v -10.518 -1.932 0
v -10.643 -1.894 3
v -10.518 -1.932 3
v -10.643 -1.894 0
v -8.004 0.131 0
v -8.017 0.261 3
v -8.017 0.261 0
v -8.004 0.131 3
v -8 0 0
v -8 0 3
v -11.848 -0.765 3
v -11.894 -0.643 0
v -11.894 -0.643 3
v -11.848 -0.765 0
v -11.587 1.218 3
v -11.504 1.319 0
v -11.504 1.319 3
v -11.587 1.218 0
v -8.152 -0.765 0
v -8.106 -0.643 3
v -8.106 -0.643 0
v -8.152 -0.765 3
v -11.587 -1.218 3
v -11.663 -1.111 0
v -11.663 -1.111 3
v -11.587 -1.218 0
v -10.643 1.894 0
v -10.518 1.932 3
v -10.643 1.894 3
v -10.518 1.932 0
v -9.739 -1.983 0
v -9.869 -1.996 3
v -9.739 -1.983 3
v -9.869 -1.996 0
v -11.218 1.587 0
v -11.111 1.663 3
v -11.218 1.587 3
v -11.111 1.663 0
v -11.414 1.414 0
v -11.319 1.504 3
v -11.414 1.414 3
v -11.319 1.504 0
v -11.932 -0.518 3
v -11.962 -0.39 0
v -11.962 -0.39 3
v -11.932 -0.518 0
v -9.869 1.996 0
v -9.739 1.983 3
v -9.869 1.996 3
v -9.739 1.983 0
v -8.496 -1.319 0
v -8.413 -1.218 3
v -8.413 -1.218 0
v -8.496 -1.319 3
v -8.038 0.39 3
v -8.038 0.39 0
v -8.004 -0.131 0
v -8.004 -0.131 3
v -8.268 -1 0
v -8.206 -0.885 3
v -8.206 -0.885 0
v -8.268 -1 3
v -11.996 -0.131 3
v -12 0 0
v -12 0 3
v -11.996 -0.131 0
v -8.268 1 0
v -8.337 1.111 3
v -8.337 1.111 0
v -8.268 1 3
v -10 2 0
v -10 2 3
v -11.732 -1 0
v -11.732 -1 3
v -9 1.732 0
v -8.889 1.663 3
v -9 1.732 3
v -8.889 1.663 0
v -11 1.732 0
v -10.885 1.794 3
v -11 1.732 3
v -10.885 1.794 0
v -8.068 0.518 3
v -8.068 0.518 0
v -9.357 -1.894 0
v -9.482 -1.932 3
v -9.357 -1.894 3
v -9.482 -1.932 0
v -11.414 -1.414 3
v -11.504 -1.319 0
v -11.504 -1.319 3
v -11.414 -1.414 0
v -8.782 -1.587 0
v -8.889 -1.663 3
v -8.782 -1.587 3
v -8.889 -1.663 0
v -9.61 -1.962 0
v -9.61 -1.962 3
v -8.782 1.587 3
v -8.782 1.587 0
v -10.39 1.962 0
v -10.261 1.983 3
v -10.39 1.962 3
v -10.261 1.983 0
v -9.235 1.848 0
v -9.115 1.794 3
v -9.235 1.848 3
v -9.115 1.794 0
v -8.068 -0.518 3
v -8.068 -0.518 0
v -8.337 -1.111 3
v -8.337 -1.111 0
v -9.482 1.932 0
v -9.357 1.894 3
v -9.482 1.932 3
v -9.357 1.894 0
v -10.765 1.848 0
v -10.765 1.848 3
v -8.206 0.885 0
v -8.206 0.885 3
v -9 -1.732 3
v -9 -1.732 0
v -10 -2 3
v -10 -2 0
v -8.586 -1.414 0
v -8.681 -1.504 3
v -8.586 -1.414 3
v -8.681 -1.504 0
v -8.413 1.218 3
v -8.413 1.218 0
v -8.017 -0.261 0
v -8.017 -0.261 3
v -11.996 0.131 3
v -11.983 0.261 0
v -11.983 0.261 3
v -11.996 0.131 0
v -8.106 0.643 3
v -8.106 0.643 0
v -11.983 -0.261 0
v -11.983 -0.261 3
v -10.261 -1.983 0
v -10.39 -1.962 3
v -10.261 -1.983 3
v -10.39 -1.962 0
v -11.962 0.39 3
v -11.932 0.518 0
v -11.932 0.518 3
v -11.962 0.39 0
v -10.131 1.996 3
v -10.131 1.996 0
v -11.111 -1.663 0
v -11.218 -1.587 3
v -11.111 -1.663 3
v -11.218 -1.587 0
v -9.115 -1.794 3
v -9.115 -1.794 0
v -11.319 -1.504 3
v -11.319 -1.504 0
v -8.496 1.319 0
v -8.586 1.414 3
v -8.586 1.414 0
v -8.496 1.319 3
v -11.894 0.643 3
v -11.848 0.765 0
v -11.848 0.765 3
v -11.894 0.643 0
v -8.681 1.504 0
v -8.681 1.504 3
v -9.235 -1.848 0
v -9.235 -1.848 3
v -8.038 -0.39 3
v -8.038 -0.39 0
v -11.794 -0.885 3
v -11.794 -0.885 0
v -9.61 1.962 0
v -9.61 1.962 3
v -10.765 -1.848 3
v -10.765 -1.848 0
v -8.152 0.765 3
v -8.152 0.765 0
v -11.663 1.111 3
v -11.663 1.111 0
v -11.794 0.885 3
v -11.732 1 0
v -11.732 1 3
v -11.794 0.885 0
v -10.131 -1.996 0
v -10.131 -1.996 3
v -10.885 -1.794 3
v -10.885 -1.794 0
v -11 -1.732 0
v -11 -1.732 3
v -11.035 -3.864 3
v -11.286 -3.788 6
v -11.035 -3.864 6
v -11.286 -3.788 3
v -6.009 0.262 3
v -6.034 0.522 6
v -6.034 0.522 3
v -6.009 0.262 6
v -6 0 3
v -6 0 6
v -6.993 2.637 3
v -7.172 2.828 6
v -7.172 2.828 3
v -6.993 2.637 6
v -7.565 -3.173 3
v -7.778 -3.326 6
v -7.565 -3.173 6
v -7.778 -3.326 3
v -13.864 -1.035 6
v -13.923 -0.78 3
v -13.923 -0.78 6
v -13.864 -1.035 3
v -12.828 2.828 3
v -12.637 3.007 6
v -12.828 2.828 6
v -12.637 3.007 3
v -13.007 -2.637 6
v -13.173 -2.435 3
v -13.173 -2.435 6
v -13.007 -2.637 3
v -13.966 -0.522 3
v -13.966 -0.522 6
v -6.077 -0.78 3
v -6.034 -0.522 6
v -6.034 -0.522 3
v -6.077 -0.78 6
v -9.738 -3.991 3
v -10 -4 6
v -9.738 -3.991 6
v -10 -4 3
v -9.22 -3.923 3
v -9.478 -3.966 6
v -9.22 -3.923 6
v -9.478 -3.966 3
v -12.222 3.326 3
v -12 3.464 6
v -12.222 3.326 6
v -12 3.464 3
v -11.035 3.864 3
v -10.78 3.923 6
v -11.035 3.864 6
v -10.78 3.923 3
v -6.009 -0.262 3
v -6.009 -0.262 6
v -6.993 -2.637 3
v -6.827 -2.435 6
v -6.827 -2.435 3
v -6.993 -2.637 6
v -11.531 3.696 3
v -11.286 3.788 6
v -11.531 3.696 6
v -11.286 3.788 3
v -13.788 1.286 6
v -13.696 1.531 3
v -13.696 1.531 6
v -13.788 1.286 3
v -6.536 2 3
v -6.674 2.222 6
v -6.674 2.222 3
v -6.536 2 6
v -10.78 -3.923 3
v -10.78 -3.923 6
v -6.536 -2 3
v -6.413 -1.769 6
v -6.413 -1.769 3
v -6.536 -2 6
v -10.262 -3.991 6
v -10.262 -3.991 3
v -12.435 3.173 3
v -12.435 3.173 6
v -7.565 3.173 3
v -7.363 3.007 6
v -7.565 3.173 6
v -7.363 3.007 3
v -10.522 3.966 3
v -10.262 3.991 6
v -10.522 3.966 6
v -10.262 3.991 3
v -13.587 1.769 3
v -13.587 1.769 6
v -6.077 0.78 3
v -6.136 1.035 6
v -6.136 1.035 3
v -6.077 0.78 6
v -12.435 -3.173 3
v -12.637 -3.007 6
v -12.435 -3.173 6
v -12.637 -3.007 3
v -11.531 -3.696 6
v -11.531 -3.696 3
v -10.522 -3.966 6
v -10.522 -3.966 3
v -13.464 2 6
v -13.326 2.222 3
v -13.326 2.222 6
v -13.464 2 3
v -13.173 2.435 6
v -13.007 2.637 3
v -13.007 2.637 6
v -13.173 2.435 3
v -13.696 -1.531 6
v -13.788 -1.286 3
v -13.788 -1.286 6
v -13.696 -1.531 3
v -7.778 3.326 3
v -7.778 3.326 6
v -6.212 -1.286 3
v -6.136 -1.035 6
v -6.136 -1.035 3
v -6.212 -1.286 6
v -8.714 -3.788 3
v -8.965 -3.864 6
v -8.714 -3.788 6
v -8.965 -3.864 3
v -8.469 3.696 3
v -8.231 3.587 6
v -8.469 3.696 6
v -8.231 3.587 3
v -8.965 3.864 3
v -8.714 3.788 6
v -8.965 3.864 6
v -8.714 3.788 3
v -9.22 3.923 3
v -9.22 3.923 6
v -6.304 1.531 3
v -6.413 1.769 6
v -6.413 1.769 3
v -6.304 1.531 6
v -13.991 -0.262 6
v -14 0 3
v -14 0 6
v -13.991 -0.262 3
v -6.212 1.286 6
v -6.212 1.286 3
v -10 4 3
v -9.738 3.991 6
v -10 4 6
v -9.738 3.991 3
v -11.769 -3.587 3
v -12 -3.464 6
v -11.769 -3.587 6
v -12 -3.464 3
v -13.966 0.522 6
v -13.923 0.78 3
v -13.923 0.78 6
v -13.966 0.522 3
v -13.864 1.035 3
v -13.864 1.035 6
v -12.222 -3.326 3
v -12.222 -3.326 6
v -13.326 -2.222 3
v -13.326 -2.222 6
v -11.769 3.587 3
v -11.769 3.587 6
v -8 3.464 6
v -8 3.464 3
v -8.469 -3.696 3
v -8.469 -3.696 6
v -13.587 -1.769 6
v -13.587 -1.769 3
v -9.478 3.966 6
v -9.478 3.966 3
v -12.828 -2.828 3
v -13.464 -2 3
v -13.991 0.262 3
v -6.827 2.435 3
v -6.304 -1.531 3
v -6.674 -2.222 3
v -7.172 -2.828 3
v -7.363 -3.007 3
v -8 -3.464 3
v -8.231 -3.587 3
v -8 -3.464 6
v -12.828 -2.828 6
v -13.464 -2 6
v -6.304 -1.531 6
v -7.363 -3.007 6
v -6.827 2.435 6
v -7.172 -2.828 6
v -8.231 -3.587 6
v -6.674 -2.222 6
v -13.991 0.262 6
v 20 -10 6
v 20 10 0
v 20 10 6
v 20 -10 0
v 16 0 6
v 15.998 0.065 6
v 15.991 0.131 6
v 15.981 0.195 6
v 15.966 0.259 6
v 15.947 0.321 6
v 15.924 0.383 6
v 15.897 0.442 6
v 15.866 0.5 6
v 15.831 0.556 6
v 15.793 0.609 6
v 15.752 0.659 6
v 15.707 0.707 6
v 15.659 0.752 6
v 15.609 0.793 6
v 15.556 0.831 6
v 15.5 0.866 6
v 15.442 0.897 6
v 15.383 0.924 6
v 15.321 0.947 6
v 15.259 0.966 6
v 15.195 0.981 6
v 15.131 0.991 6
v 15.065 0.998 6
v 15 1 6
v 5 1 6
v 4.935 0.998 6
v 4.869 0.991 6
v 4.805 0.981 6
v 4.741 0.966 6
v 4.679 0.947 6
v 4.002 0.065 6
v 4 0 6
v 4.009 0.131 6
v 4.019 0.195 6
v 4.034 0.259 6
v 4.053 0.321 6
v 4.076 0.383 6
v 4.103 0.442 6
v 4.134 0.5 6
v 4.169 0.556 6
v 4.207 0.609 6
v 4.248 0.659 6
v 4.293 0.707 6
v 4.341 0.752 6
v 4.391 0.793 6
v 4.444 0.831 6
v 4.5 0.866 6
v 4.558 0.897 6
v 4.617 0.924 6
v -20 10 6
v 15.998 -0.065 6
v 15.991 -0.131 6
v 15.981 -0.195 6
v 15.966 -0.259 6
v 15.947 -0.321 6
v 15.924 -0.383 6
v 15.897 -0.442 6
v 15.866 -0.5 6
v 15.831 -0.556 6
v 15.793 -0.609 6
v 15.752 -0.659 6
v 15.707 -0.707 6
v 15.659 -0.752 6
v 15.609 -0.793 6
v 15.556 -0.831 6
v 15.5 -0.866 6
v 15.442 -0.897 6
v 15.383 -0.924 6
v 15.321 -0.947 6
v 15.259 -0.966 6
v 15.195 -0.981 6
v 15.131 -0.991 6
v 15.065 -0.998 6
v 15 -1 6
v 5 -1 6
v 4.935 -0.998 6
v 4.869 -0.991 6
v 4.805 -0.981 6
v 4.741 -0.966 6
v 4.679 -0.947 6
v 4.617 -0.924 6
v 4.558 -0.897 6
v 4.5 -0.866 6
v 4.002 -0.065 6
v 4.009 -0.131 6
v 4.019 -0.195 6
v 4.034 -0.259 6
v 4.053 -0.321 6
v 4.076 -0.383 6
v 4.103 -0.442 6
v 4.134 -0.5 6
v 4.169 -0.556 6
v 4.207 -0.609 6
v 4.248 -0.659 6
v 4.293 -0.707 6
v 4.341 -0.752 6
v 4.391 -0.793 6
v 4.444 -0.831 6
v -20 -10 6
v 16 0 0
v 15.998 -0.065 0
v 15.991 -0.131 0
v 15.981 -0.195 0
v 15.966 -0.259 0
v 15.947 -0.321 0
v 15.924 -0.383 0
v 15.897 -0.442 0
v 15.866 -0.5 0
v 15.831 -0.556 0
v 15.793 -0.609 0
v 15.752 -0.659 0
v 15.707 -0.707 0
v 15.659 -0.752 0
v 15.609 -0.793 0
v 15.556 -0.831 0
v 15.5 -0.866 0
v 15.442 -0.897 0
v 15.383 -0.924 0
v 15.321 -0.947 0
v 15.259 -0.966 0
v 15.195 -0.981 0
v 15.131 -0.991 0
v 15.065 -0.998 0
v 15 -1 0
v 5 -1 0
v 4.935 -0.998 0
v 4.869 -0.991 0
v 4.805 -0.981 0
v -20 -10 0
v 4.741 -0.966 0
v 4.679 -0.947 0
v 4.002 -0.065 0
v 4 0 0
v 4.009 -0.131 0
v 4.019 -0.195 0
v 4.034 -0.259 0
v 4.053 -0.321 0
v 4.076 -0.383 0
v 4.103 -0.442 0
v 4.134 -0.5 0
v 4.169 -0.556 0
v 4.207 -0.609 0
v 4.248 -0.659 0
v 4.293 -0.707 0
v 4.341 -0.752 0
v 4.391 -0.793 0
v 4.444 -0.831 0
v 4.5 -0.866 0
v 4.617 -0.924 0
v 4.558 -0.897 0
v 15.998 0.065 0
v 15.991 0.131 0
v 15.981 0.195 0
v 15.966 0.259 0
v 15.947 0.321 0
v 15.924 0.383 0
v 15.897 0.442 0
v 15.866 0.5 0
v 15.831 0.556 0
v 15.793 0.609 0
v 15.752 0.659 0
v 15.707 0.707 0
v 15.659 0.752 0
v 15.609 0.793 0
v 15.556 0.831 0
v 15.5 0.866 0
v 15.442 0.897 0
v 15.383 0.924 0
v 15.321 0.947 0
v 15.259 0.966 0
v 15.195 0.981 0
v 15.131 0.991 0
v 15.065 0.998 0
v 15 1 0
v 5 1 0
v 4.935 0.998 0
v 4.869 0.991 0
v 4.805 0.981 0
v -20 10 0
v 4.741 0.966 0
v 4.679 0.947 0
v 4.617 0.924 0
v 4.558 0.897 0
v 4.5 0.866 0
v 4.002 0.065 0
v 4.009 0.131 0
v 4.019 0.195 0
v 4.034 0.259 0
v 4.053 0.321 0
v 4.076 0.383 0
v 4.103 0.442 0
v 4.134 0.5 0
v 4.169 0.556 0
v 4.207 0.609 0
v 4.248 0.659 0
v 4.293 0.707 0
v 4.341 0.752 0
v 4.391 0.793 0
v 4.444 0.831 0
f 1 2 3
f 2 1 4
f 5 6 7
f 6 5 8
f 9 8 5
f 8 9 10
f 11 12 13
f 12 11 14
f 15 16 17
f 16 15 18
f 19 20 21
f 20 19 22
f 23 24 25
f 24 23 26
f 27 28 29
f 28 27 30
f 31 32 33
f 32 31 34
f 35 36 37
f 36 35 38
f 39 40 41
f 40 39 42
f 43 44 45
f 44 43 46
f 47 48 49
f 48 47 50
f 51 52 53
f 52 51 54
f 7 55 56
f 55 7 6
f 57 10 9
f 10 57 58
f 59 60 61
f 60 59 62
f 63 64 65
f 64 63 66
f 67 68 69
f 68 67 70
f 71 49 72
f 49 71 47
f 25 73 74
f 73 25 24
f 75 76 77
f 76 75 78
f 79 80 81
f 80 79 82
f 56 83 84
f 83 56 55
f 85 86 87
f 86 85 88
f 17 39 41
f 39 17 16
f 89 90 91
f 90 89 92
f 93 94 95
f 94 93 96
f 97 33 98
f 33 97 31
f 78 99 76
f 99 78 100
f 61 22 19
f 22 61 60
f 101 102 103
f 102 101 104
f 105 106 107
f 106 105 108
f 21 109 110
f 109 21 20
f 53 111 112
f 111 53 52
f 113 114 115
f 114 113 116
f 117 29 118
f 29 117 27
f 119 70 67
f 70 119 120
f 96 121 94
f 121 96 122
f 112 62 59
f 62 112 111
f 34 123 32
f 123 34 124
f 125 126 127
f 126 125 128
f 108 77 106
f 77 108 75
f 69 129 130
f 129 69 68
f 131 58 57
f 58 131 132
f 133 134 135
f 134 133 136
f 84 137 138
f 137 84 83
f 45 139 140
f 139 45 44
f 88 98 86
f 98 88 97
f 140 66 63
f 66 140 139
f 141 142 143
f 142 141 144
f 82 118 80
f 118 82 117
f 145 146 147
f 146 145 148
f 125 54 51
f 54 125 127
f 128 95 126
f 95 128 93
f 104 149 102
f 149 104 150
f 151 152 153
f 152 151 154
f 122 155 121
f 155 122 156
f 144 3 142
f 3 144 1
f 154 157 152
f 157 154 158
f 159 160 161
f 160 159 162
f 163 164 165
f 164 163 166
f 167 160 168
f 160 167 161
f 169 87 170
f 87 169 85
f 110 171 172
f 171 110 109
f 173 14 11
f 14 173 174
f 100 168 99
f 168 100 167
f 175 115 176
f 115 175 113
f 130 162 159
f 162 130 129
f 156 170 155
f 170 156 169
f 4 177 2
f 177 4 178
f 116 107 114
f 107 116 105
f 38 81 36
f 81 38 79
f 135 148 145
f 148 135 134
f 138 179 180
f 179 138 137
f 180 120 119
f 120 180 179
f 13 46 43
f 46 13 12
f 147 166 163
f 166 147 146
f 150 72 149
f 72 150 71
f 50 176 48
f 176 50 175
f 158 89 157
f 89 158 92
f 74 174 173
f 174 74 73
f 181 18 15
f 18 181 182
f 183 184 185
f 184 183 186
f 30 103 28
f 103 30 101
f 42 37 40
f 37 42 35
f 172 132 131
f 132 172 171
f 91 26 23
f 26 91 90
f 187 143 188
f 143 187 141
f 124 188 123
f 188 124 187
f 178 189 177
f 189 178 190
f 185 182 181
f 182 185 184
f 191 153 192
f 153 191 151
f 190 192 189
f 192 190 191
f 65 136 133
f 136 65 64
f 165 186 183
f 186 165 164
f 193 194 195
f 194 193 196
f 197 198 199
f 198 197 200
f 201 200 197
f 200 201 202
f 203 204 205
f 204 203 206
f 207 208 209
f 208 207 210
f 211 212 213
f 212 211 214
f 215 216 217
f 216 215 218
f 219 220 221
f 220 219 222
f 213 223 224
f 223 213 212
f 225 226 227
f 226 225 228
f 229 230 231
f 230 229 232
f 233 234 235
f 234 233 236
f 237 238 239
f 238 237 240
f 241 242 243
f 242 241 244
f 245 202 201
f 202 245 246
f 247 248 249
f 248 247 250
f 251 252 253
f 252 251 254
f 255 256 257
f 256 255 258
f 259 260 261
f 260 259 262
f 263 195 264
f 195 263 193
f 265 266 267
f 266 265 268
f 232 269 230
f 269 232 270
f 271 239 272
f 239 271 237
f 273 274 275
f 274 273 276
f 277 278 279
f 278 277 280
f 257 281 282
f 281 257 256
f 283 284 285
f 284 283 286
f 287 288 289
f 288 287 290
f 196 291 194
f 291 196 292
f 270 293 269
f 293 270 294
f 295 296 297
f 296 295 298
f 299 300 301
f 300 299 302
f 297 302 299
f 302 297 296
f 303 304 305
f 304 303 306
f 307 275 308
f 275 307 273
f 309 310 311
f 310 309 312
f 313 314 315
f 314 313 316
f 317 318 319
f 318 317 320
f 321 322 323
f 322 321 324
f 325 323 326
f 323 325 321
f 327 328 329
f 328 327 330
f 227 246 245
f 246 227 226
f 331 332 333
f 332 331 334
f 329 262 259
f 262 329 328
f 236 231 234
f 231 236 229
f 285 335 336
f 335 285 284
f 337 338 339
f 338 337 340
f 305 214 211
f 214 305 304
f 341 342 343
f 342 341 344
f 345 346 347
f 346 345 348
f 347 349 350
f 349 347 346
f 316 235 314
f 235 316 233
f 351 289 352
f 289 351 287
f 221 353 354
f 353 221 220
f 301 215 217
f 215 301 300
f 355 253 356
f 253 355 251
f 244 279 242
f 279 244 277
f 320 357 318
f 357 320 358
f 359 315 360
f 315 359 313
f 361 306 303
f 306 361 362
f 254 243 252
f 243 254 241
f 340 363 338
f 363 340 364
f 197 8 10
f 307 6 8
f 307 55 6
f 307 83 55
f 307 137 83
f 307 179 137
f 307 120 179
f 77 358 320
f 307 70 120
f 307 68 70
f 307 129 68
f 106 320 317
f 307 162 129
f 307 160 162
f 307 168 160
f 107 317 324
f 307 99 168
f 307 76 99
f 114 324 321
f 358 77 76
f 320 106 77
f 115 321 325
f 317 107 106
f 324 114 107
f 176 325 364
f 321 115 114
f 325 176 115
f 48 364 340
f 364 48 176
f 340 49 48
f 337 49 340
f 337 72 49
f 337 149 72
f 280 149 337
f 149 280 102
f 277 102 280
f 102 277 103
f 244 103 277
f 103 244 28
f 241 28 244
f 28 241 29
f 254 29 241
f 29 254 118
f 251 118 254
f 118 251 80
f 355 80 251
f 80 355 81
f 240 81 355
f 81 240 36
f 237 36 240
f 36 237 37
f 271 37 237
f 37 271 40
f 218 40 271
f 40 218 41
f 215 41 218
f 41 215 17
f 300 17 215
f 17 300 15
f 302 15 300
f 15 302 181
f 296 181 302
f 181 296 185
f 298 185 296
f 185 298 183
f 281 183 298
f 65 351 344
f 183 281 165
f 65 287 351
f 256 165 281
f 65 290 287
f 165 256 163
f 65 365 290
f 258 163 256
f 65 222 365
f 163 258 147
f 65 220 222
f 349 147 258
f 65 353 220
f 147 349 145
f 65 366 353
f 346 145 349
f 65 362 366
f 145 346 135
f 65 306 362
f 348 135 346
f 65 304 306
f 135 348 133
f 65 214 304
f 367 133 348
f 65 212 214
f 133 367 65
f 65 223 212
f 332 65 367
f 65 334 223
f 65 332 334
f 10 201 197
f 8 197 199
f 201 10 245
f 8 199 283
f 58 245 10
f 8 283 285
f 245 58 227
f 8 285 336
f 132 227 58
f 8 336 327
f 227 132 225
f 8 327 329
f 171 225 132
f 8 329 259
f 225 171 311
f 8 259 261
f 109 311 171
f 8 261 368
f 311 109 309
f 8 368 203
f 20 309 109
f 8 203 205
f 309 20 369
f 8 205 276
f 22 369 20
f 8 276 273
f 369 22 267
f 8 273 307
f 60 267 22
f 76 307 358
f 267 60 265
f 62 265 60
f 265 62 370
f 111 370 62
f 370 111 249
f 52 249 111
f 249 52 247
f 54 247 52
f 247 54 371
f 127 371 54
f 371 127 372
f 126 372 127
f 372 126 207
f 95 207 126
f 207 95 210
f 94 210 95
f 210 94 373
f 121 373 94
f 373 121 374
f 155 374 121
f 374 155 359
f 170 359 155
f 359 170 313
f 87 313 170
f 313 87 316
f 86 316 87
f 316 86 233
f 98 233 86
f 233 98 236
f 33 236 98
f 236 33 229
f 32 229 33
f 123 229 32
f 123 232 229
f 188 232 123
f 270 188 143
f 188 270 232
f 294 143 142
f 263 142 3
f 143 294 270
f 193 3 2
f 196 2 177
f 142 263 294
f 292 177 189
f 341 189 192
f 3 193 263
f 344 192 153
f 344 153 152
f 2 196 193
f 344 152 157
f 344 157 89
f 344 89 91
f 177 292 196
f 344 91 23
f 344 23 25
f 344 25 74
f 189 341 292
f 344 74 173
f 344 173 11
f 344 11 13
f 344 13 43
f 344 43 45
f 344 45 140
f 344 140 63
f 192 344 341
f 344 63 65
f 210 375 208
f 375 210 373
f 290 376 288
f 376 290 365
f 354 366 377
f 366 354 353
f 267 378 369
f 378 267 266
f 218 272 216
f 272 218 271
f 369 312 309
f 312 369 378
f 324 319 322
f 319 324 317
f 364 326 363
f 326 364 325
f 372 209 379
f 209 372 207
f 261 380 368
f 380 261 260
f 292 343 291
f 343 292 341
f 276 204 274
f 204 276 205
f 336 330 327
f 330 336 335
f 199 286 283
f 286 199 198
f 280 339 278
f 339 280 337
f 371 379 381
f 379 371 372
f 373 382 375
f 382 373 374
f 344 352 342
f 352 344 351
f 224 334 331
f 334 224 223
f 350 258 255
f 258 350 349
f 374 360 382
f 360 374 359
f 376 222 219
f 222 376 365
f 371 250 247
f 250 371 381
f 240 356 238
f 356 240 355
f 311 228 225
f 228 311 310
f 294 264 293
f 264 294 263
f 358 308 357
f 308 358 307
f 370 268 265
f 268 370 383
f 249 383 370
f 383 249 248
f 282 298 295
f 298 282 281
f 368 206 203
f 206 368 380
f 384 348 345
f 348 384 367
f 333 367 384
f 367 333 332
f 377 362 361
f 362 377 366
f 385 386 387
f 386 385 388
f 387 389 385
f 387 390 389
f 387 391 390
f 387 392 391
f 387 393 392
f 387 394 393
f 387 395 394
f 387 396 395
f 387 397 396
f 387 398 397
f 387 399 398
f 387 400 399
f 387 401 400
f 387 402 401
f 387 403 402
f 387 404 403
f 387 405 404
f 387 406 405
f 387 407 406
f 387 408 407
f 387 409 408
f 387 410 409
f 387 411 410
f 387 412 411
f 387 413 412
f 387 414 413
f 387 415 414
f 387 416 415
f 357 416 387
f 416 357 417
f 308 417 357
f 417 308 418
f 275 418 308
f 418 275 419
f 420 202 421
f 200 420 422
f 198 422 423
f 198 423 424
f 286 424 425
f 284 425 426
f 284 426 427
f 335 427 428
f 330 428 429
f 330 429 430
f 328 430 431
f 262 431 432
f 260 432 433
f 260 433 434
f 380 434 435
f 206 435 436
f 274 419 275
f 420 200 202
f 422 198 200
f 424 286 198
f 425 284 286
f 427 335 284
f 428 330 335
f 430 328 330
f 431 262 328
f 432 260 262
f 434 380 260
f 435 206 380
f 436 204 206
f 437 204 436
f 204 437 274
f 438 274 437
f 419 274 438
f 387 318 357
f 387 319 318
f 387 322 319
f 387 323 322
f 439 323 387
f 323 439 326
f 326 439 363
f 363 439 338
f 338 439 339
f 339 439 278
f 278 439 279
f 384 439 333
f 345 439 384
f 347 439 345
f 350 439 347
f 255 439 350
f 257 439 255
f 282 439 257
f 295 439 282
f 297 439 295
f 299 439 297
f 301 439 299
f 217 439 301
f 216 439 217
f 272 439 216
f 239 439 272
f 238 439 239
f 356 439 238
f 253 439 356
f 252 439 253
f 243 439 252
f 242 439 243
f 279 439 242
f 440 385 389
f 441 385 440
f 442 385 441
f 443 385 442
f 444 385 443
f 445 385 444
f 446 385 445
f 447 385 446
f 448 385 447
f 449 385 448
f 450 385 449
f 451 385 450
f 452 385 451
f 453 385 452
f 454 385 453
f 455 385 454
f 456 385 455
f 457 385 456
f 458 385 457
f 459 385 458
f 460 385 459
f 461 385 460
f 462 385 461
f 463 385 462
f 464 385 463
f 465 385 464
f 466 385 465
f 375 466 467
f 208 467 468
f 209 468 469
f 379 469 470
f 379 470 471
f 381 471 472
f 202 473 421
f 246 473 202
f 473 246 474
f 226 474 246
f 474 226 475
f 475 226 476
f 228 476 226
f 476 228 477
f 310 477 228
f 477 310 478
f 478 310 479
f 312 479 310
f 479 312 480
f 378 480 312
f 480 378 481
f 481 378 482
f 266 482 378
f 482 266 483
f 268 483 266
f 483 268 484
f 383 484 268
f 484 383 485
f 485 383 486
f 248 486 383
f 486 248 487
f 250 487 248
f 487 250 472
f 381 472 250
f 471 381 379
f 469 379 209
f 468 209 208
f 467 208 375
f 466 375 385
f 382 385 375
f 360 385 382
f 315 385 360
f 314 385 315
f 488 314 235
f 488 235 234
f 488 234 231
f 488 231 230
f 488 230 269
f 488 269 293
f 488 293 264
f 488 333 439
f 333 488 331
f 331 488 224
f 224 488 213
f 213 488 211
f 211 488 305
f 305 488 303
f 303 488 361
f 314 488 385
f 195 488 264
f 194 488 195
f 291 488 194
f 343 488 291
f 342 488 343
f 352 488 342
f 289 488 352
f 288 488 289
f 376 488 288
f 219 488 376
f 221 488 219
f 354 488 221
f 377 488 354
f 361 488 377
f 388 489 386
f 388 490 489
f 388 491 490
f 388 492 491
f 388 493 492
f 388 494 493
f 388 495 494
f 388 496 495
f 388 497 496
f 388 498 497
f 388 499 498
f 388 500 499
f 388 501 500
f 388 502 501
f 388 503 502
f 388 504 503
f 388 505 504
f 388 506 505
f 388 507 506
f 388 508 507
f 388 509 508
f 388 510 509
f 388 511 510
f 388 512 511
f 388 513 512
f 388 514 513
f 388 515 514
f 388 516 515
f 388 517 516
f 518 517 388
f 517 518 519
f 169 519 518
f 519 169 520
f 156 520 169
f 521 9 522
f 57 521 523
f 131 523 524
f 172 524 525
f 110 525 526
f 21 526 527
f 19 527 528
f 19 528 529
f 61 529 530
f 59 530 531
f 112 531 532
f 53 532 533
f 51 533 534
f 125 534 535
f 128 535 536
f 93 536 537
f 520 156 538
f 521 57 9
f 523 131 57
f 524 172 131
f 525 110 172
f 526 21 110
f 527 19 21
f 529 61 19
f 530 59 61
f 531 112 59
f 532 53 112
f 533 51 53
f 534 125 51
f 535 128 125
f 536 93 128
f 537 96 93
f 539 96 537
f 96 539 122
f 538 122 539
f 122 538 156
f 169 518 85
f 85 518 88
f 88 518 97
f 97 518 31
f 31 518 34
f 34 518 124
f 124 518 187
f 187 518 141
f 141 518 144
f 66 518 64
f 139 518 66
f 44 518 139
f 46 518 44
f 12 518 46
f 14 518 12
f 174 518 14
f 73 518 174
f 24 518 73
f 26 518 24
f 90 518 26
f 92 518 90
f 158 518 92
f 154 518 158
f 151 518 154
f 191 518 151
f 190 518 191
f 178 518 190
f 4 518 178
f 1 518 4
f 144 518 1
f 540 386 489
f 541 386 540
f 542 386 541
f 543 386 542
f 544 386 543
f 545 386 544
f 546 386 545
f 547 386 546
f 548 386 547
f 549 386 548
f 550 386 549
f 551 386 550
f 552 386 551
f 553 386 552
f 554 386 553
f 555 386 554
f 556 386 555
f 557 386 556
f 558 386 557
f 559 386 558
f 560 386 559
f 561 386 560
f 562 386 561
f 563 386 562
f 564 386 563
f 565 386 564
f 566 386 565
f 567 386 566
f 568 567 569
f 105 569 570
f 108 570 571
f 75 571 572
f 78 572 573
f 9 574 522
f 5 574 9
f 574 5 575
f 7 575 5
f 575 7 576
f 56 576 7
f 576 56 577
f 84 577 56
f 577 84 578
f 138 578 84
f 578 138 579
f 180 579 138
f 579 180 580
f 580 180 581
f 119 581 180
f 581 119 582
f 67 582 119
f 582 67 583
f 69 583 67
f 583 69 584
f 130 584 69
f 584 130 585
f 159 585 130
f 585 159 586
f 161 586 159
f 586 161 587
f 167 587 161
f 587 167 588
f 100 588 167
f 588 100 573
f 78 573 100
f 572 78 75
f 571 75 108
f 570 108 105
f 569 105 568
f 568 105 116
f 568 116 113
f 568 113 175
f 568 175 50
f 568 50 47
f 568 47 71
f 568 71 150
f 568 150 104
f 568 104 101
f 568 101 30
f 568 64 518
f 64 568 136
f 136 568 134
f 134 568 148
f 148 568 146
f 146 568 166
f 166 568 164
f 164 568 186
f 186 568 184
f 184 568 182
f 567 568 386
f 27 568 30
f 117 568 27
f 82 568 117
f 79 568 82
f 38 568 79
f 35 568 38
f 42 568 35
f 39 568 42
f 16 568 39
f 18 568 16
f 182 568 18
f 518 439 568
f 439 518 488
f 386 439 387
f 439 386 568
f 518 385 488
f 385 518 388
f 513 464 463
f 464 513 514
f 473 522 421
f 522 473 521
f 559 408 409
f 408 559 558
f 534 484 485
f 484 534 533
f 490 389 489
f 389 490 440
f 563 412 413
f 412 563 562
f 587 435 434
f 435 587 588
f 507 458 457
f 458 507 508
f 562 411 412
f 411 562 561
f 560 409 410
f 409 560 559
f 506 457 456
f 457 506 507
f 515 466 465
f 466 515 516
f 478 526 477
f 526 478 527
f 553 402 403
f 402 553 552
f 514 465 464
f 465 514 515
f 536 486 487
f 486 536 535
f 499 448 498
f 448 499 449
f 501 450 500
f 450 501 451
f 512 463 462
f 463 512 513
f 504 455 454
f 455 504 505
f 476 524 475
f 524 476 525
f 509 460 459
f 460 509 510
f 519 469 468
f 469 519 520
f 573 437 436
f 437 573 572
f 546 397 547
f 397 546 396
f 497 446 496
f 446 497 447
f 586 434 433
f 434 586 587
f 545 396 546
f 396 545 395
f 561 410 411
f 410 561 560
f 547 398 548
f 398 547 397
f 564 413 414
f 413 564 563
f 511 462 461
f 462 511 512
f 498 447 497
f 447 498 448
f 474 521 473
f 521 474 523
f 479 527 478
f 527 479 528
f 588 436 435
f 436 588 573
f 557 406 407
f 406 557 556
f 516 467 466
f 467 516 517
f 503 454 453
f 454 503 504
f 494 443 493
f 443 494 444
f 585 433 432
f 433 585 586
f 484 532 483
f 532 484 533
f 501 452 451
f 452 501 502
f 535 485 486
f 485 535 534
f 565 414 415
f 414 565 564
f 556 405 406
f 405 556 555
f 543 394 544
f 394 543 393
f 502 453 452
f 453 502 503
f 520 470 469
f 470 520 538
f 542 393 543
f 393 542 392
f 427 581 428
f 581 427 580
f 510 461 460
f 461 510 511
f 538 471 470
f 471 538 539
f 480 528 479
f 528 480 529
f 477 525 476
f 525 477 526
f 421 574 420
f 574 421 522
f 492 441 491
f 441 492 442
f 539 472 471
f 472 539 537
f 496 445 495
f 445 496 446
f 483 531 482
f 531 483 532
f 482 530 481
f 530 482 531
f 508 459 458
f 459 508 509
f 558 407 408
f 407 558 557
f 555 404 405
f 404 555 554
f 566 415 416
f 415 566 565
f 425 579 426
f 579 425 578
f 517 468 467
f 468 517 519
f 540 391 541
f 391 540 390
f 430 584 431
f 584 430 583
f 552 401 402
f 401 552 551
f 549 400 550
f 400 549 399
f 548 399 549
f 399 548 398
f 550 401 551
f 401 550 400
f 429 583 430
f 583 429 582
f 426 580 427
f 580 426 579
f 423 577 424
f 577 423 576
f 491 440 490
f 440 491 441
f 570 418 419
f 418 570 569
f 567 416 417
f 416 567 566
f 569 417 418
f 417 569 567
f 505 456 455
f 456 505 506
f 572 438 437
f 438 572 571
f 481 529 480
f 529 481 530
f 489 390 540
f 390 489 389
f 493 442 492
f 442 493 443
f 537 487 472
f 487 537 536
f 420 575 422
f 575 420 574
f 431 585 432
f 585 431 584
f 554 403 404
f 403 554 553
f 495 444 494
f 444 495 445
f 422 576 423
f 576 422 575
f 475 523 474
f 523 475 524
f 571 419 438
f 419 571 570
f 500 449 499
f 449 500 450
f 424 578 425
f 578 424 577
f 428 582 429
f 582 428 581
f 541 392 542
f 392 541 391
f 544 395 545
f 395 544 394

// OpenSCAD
// Auto-generated from tests/data/feature_fixtures_manifest.json
// fixture: plate_counterbore_and_slot
// fixture_type: plate
// description: One counterbore plus one slot on a single thick plate. Exercises mixed detection.
$fn = 96;

plate_size = [40.000000, 20.000000, 6.000000];
plate_origin = [-20.000000, -10.000000, 0.000000];

module through_hole(center, diameter, height) {
  translate(center) cylinder(d=diameter, h=height, center=false);
}

module through_slot(start, end, width, height) {
  hull() {
    through_hole(start, width, height);
    through_hole(end, width, height);
  }
}

module counterbore_hole(center, through_d, bore_d, bore_depth, plate_thickness) {
  translate([center[0], center[1], -0.1])
    cylinder(d=through_d, h=plate_thickness + 0.2, center=false);
  translate([center[0], center[1], plate_thickness - bore_depth])
    cylinder(d=bore_d, h=bore_depth + 0.1, center=false);
}

difference() {
  translate(plate_origin) cube(plate_size);
  counterbore_hole([-10.000000, 0.000000, 0.000000], 4.000000, 8.000000, 3.000000, 6.000000);  // counterbore_0
  through_slot([5.000000, 0.000000, -0.100000], [15.000000, 0.000000, -0.100000], 2.000000, 6.200000);  // slot_0
}
